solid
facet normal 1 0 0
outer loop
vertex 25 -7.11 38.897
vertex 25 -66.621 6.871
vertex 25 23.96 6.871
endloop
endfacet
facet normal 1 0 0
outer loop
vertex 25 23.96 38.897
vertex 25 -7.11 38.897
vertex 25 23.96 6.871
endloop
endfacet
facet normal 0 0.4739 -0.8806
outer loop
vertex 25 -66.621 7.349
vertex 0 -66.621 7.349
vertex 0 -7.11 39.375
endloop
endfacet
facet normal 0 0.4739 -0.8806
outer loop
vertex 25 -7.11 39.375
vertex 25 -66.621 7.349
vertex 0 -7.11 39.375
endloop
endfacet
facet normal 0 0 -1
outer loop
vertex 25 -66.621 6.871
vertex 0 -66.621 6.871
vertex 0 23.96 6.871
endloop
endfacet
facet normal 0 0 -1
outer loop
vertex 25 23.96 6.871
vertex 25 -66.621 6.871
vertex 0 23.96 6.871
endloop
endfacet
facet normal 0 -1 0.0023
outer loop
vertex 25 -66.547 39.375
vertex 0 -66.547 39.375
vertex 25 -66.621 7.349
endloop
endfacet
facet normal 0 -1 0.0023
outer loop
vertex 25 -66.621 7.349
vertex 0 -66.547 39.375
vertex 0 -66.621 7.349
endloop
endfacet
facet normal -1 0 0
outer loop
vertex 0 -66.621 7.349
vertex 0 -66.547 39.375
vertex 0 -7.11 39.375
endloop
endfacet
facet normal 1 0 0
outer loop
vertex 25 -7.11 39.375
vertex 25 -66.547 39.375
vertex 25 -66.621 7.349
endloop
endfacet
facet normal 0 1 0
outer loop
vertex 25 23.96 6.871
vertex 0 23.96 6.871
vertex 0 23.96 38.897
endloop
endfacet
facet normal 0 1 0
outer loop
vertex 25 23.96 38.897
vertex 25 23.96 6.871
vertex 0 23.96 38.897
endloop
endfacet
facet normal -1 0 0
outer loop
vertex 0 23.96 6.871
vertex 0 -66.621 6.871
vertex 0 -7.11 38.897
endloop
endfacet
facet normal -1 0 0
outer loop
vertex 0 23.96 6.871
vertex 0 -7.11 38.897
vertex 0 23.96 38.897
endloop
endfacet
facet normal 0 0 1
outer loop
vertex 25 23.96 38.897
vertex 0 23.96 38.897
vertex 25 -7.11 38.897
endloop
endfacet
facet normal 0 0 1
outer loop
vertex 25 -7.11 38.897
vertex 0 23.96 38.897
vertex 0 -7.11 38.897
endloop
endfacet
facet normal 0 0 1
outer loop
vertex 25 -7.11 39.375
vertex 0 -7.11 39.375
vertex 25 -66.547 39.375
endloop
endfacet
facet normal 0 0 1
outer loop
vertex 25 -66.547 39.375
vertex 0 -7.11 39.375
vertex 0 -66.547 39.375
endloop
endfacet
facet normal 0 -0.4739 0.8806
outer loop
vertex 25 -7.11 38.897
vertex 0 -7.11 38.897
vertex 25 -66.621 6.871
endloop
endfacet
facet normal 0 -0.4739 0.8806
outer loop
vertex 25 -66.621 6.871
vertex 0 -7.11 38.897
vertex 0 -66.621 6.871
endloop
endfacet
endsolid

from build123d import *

# Parameters (mm, degrees)
F1_DEPTH = 25
F3_DEPTH = 25


with BuildPart() as f1:
    # F0 (on Right) → F1 (new body)
    with BuildSketch(Plane.YZ):
        Polygon((-7.110205, 39.375003), (-66.546806, 39.375003), (-66.620834, 7.349203), align=None)
    extrude(amount=F1_DEPTH)


with BuildPart() as f3:
    # F2 (on Right) → F3 (new body)
    with BuildSketch(Plane.YZ):
        Polygon((-7.110205, 38.897004), (-66.620834, 6.871207), (23.959598, 6.871207), (23.959598, 38.897004), align=None)
    extrude(amount=F3_DEPTH)


solid = Compound([f1.part, f3.part])
